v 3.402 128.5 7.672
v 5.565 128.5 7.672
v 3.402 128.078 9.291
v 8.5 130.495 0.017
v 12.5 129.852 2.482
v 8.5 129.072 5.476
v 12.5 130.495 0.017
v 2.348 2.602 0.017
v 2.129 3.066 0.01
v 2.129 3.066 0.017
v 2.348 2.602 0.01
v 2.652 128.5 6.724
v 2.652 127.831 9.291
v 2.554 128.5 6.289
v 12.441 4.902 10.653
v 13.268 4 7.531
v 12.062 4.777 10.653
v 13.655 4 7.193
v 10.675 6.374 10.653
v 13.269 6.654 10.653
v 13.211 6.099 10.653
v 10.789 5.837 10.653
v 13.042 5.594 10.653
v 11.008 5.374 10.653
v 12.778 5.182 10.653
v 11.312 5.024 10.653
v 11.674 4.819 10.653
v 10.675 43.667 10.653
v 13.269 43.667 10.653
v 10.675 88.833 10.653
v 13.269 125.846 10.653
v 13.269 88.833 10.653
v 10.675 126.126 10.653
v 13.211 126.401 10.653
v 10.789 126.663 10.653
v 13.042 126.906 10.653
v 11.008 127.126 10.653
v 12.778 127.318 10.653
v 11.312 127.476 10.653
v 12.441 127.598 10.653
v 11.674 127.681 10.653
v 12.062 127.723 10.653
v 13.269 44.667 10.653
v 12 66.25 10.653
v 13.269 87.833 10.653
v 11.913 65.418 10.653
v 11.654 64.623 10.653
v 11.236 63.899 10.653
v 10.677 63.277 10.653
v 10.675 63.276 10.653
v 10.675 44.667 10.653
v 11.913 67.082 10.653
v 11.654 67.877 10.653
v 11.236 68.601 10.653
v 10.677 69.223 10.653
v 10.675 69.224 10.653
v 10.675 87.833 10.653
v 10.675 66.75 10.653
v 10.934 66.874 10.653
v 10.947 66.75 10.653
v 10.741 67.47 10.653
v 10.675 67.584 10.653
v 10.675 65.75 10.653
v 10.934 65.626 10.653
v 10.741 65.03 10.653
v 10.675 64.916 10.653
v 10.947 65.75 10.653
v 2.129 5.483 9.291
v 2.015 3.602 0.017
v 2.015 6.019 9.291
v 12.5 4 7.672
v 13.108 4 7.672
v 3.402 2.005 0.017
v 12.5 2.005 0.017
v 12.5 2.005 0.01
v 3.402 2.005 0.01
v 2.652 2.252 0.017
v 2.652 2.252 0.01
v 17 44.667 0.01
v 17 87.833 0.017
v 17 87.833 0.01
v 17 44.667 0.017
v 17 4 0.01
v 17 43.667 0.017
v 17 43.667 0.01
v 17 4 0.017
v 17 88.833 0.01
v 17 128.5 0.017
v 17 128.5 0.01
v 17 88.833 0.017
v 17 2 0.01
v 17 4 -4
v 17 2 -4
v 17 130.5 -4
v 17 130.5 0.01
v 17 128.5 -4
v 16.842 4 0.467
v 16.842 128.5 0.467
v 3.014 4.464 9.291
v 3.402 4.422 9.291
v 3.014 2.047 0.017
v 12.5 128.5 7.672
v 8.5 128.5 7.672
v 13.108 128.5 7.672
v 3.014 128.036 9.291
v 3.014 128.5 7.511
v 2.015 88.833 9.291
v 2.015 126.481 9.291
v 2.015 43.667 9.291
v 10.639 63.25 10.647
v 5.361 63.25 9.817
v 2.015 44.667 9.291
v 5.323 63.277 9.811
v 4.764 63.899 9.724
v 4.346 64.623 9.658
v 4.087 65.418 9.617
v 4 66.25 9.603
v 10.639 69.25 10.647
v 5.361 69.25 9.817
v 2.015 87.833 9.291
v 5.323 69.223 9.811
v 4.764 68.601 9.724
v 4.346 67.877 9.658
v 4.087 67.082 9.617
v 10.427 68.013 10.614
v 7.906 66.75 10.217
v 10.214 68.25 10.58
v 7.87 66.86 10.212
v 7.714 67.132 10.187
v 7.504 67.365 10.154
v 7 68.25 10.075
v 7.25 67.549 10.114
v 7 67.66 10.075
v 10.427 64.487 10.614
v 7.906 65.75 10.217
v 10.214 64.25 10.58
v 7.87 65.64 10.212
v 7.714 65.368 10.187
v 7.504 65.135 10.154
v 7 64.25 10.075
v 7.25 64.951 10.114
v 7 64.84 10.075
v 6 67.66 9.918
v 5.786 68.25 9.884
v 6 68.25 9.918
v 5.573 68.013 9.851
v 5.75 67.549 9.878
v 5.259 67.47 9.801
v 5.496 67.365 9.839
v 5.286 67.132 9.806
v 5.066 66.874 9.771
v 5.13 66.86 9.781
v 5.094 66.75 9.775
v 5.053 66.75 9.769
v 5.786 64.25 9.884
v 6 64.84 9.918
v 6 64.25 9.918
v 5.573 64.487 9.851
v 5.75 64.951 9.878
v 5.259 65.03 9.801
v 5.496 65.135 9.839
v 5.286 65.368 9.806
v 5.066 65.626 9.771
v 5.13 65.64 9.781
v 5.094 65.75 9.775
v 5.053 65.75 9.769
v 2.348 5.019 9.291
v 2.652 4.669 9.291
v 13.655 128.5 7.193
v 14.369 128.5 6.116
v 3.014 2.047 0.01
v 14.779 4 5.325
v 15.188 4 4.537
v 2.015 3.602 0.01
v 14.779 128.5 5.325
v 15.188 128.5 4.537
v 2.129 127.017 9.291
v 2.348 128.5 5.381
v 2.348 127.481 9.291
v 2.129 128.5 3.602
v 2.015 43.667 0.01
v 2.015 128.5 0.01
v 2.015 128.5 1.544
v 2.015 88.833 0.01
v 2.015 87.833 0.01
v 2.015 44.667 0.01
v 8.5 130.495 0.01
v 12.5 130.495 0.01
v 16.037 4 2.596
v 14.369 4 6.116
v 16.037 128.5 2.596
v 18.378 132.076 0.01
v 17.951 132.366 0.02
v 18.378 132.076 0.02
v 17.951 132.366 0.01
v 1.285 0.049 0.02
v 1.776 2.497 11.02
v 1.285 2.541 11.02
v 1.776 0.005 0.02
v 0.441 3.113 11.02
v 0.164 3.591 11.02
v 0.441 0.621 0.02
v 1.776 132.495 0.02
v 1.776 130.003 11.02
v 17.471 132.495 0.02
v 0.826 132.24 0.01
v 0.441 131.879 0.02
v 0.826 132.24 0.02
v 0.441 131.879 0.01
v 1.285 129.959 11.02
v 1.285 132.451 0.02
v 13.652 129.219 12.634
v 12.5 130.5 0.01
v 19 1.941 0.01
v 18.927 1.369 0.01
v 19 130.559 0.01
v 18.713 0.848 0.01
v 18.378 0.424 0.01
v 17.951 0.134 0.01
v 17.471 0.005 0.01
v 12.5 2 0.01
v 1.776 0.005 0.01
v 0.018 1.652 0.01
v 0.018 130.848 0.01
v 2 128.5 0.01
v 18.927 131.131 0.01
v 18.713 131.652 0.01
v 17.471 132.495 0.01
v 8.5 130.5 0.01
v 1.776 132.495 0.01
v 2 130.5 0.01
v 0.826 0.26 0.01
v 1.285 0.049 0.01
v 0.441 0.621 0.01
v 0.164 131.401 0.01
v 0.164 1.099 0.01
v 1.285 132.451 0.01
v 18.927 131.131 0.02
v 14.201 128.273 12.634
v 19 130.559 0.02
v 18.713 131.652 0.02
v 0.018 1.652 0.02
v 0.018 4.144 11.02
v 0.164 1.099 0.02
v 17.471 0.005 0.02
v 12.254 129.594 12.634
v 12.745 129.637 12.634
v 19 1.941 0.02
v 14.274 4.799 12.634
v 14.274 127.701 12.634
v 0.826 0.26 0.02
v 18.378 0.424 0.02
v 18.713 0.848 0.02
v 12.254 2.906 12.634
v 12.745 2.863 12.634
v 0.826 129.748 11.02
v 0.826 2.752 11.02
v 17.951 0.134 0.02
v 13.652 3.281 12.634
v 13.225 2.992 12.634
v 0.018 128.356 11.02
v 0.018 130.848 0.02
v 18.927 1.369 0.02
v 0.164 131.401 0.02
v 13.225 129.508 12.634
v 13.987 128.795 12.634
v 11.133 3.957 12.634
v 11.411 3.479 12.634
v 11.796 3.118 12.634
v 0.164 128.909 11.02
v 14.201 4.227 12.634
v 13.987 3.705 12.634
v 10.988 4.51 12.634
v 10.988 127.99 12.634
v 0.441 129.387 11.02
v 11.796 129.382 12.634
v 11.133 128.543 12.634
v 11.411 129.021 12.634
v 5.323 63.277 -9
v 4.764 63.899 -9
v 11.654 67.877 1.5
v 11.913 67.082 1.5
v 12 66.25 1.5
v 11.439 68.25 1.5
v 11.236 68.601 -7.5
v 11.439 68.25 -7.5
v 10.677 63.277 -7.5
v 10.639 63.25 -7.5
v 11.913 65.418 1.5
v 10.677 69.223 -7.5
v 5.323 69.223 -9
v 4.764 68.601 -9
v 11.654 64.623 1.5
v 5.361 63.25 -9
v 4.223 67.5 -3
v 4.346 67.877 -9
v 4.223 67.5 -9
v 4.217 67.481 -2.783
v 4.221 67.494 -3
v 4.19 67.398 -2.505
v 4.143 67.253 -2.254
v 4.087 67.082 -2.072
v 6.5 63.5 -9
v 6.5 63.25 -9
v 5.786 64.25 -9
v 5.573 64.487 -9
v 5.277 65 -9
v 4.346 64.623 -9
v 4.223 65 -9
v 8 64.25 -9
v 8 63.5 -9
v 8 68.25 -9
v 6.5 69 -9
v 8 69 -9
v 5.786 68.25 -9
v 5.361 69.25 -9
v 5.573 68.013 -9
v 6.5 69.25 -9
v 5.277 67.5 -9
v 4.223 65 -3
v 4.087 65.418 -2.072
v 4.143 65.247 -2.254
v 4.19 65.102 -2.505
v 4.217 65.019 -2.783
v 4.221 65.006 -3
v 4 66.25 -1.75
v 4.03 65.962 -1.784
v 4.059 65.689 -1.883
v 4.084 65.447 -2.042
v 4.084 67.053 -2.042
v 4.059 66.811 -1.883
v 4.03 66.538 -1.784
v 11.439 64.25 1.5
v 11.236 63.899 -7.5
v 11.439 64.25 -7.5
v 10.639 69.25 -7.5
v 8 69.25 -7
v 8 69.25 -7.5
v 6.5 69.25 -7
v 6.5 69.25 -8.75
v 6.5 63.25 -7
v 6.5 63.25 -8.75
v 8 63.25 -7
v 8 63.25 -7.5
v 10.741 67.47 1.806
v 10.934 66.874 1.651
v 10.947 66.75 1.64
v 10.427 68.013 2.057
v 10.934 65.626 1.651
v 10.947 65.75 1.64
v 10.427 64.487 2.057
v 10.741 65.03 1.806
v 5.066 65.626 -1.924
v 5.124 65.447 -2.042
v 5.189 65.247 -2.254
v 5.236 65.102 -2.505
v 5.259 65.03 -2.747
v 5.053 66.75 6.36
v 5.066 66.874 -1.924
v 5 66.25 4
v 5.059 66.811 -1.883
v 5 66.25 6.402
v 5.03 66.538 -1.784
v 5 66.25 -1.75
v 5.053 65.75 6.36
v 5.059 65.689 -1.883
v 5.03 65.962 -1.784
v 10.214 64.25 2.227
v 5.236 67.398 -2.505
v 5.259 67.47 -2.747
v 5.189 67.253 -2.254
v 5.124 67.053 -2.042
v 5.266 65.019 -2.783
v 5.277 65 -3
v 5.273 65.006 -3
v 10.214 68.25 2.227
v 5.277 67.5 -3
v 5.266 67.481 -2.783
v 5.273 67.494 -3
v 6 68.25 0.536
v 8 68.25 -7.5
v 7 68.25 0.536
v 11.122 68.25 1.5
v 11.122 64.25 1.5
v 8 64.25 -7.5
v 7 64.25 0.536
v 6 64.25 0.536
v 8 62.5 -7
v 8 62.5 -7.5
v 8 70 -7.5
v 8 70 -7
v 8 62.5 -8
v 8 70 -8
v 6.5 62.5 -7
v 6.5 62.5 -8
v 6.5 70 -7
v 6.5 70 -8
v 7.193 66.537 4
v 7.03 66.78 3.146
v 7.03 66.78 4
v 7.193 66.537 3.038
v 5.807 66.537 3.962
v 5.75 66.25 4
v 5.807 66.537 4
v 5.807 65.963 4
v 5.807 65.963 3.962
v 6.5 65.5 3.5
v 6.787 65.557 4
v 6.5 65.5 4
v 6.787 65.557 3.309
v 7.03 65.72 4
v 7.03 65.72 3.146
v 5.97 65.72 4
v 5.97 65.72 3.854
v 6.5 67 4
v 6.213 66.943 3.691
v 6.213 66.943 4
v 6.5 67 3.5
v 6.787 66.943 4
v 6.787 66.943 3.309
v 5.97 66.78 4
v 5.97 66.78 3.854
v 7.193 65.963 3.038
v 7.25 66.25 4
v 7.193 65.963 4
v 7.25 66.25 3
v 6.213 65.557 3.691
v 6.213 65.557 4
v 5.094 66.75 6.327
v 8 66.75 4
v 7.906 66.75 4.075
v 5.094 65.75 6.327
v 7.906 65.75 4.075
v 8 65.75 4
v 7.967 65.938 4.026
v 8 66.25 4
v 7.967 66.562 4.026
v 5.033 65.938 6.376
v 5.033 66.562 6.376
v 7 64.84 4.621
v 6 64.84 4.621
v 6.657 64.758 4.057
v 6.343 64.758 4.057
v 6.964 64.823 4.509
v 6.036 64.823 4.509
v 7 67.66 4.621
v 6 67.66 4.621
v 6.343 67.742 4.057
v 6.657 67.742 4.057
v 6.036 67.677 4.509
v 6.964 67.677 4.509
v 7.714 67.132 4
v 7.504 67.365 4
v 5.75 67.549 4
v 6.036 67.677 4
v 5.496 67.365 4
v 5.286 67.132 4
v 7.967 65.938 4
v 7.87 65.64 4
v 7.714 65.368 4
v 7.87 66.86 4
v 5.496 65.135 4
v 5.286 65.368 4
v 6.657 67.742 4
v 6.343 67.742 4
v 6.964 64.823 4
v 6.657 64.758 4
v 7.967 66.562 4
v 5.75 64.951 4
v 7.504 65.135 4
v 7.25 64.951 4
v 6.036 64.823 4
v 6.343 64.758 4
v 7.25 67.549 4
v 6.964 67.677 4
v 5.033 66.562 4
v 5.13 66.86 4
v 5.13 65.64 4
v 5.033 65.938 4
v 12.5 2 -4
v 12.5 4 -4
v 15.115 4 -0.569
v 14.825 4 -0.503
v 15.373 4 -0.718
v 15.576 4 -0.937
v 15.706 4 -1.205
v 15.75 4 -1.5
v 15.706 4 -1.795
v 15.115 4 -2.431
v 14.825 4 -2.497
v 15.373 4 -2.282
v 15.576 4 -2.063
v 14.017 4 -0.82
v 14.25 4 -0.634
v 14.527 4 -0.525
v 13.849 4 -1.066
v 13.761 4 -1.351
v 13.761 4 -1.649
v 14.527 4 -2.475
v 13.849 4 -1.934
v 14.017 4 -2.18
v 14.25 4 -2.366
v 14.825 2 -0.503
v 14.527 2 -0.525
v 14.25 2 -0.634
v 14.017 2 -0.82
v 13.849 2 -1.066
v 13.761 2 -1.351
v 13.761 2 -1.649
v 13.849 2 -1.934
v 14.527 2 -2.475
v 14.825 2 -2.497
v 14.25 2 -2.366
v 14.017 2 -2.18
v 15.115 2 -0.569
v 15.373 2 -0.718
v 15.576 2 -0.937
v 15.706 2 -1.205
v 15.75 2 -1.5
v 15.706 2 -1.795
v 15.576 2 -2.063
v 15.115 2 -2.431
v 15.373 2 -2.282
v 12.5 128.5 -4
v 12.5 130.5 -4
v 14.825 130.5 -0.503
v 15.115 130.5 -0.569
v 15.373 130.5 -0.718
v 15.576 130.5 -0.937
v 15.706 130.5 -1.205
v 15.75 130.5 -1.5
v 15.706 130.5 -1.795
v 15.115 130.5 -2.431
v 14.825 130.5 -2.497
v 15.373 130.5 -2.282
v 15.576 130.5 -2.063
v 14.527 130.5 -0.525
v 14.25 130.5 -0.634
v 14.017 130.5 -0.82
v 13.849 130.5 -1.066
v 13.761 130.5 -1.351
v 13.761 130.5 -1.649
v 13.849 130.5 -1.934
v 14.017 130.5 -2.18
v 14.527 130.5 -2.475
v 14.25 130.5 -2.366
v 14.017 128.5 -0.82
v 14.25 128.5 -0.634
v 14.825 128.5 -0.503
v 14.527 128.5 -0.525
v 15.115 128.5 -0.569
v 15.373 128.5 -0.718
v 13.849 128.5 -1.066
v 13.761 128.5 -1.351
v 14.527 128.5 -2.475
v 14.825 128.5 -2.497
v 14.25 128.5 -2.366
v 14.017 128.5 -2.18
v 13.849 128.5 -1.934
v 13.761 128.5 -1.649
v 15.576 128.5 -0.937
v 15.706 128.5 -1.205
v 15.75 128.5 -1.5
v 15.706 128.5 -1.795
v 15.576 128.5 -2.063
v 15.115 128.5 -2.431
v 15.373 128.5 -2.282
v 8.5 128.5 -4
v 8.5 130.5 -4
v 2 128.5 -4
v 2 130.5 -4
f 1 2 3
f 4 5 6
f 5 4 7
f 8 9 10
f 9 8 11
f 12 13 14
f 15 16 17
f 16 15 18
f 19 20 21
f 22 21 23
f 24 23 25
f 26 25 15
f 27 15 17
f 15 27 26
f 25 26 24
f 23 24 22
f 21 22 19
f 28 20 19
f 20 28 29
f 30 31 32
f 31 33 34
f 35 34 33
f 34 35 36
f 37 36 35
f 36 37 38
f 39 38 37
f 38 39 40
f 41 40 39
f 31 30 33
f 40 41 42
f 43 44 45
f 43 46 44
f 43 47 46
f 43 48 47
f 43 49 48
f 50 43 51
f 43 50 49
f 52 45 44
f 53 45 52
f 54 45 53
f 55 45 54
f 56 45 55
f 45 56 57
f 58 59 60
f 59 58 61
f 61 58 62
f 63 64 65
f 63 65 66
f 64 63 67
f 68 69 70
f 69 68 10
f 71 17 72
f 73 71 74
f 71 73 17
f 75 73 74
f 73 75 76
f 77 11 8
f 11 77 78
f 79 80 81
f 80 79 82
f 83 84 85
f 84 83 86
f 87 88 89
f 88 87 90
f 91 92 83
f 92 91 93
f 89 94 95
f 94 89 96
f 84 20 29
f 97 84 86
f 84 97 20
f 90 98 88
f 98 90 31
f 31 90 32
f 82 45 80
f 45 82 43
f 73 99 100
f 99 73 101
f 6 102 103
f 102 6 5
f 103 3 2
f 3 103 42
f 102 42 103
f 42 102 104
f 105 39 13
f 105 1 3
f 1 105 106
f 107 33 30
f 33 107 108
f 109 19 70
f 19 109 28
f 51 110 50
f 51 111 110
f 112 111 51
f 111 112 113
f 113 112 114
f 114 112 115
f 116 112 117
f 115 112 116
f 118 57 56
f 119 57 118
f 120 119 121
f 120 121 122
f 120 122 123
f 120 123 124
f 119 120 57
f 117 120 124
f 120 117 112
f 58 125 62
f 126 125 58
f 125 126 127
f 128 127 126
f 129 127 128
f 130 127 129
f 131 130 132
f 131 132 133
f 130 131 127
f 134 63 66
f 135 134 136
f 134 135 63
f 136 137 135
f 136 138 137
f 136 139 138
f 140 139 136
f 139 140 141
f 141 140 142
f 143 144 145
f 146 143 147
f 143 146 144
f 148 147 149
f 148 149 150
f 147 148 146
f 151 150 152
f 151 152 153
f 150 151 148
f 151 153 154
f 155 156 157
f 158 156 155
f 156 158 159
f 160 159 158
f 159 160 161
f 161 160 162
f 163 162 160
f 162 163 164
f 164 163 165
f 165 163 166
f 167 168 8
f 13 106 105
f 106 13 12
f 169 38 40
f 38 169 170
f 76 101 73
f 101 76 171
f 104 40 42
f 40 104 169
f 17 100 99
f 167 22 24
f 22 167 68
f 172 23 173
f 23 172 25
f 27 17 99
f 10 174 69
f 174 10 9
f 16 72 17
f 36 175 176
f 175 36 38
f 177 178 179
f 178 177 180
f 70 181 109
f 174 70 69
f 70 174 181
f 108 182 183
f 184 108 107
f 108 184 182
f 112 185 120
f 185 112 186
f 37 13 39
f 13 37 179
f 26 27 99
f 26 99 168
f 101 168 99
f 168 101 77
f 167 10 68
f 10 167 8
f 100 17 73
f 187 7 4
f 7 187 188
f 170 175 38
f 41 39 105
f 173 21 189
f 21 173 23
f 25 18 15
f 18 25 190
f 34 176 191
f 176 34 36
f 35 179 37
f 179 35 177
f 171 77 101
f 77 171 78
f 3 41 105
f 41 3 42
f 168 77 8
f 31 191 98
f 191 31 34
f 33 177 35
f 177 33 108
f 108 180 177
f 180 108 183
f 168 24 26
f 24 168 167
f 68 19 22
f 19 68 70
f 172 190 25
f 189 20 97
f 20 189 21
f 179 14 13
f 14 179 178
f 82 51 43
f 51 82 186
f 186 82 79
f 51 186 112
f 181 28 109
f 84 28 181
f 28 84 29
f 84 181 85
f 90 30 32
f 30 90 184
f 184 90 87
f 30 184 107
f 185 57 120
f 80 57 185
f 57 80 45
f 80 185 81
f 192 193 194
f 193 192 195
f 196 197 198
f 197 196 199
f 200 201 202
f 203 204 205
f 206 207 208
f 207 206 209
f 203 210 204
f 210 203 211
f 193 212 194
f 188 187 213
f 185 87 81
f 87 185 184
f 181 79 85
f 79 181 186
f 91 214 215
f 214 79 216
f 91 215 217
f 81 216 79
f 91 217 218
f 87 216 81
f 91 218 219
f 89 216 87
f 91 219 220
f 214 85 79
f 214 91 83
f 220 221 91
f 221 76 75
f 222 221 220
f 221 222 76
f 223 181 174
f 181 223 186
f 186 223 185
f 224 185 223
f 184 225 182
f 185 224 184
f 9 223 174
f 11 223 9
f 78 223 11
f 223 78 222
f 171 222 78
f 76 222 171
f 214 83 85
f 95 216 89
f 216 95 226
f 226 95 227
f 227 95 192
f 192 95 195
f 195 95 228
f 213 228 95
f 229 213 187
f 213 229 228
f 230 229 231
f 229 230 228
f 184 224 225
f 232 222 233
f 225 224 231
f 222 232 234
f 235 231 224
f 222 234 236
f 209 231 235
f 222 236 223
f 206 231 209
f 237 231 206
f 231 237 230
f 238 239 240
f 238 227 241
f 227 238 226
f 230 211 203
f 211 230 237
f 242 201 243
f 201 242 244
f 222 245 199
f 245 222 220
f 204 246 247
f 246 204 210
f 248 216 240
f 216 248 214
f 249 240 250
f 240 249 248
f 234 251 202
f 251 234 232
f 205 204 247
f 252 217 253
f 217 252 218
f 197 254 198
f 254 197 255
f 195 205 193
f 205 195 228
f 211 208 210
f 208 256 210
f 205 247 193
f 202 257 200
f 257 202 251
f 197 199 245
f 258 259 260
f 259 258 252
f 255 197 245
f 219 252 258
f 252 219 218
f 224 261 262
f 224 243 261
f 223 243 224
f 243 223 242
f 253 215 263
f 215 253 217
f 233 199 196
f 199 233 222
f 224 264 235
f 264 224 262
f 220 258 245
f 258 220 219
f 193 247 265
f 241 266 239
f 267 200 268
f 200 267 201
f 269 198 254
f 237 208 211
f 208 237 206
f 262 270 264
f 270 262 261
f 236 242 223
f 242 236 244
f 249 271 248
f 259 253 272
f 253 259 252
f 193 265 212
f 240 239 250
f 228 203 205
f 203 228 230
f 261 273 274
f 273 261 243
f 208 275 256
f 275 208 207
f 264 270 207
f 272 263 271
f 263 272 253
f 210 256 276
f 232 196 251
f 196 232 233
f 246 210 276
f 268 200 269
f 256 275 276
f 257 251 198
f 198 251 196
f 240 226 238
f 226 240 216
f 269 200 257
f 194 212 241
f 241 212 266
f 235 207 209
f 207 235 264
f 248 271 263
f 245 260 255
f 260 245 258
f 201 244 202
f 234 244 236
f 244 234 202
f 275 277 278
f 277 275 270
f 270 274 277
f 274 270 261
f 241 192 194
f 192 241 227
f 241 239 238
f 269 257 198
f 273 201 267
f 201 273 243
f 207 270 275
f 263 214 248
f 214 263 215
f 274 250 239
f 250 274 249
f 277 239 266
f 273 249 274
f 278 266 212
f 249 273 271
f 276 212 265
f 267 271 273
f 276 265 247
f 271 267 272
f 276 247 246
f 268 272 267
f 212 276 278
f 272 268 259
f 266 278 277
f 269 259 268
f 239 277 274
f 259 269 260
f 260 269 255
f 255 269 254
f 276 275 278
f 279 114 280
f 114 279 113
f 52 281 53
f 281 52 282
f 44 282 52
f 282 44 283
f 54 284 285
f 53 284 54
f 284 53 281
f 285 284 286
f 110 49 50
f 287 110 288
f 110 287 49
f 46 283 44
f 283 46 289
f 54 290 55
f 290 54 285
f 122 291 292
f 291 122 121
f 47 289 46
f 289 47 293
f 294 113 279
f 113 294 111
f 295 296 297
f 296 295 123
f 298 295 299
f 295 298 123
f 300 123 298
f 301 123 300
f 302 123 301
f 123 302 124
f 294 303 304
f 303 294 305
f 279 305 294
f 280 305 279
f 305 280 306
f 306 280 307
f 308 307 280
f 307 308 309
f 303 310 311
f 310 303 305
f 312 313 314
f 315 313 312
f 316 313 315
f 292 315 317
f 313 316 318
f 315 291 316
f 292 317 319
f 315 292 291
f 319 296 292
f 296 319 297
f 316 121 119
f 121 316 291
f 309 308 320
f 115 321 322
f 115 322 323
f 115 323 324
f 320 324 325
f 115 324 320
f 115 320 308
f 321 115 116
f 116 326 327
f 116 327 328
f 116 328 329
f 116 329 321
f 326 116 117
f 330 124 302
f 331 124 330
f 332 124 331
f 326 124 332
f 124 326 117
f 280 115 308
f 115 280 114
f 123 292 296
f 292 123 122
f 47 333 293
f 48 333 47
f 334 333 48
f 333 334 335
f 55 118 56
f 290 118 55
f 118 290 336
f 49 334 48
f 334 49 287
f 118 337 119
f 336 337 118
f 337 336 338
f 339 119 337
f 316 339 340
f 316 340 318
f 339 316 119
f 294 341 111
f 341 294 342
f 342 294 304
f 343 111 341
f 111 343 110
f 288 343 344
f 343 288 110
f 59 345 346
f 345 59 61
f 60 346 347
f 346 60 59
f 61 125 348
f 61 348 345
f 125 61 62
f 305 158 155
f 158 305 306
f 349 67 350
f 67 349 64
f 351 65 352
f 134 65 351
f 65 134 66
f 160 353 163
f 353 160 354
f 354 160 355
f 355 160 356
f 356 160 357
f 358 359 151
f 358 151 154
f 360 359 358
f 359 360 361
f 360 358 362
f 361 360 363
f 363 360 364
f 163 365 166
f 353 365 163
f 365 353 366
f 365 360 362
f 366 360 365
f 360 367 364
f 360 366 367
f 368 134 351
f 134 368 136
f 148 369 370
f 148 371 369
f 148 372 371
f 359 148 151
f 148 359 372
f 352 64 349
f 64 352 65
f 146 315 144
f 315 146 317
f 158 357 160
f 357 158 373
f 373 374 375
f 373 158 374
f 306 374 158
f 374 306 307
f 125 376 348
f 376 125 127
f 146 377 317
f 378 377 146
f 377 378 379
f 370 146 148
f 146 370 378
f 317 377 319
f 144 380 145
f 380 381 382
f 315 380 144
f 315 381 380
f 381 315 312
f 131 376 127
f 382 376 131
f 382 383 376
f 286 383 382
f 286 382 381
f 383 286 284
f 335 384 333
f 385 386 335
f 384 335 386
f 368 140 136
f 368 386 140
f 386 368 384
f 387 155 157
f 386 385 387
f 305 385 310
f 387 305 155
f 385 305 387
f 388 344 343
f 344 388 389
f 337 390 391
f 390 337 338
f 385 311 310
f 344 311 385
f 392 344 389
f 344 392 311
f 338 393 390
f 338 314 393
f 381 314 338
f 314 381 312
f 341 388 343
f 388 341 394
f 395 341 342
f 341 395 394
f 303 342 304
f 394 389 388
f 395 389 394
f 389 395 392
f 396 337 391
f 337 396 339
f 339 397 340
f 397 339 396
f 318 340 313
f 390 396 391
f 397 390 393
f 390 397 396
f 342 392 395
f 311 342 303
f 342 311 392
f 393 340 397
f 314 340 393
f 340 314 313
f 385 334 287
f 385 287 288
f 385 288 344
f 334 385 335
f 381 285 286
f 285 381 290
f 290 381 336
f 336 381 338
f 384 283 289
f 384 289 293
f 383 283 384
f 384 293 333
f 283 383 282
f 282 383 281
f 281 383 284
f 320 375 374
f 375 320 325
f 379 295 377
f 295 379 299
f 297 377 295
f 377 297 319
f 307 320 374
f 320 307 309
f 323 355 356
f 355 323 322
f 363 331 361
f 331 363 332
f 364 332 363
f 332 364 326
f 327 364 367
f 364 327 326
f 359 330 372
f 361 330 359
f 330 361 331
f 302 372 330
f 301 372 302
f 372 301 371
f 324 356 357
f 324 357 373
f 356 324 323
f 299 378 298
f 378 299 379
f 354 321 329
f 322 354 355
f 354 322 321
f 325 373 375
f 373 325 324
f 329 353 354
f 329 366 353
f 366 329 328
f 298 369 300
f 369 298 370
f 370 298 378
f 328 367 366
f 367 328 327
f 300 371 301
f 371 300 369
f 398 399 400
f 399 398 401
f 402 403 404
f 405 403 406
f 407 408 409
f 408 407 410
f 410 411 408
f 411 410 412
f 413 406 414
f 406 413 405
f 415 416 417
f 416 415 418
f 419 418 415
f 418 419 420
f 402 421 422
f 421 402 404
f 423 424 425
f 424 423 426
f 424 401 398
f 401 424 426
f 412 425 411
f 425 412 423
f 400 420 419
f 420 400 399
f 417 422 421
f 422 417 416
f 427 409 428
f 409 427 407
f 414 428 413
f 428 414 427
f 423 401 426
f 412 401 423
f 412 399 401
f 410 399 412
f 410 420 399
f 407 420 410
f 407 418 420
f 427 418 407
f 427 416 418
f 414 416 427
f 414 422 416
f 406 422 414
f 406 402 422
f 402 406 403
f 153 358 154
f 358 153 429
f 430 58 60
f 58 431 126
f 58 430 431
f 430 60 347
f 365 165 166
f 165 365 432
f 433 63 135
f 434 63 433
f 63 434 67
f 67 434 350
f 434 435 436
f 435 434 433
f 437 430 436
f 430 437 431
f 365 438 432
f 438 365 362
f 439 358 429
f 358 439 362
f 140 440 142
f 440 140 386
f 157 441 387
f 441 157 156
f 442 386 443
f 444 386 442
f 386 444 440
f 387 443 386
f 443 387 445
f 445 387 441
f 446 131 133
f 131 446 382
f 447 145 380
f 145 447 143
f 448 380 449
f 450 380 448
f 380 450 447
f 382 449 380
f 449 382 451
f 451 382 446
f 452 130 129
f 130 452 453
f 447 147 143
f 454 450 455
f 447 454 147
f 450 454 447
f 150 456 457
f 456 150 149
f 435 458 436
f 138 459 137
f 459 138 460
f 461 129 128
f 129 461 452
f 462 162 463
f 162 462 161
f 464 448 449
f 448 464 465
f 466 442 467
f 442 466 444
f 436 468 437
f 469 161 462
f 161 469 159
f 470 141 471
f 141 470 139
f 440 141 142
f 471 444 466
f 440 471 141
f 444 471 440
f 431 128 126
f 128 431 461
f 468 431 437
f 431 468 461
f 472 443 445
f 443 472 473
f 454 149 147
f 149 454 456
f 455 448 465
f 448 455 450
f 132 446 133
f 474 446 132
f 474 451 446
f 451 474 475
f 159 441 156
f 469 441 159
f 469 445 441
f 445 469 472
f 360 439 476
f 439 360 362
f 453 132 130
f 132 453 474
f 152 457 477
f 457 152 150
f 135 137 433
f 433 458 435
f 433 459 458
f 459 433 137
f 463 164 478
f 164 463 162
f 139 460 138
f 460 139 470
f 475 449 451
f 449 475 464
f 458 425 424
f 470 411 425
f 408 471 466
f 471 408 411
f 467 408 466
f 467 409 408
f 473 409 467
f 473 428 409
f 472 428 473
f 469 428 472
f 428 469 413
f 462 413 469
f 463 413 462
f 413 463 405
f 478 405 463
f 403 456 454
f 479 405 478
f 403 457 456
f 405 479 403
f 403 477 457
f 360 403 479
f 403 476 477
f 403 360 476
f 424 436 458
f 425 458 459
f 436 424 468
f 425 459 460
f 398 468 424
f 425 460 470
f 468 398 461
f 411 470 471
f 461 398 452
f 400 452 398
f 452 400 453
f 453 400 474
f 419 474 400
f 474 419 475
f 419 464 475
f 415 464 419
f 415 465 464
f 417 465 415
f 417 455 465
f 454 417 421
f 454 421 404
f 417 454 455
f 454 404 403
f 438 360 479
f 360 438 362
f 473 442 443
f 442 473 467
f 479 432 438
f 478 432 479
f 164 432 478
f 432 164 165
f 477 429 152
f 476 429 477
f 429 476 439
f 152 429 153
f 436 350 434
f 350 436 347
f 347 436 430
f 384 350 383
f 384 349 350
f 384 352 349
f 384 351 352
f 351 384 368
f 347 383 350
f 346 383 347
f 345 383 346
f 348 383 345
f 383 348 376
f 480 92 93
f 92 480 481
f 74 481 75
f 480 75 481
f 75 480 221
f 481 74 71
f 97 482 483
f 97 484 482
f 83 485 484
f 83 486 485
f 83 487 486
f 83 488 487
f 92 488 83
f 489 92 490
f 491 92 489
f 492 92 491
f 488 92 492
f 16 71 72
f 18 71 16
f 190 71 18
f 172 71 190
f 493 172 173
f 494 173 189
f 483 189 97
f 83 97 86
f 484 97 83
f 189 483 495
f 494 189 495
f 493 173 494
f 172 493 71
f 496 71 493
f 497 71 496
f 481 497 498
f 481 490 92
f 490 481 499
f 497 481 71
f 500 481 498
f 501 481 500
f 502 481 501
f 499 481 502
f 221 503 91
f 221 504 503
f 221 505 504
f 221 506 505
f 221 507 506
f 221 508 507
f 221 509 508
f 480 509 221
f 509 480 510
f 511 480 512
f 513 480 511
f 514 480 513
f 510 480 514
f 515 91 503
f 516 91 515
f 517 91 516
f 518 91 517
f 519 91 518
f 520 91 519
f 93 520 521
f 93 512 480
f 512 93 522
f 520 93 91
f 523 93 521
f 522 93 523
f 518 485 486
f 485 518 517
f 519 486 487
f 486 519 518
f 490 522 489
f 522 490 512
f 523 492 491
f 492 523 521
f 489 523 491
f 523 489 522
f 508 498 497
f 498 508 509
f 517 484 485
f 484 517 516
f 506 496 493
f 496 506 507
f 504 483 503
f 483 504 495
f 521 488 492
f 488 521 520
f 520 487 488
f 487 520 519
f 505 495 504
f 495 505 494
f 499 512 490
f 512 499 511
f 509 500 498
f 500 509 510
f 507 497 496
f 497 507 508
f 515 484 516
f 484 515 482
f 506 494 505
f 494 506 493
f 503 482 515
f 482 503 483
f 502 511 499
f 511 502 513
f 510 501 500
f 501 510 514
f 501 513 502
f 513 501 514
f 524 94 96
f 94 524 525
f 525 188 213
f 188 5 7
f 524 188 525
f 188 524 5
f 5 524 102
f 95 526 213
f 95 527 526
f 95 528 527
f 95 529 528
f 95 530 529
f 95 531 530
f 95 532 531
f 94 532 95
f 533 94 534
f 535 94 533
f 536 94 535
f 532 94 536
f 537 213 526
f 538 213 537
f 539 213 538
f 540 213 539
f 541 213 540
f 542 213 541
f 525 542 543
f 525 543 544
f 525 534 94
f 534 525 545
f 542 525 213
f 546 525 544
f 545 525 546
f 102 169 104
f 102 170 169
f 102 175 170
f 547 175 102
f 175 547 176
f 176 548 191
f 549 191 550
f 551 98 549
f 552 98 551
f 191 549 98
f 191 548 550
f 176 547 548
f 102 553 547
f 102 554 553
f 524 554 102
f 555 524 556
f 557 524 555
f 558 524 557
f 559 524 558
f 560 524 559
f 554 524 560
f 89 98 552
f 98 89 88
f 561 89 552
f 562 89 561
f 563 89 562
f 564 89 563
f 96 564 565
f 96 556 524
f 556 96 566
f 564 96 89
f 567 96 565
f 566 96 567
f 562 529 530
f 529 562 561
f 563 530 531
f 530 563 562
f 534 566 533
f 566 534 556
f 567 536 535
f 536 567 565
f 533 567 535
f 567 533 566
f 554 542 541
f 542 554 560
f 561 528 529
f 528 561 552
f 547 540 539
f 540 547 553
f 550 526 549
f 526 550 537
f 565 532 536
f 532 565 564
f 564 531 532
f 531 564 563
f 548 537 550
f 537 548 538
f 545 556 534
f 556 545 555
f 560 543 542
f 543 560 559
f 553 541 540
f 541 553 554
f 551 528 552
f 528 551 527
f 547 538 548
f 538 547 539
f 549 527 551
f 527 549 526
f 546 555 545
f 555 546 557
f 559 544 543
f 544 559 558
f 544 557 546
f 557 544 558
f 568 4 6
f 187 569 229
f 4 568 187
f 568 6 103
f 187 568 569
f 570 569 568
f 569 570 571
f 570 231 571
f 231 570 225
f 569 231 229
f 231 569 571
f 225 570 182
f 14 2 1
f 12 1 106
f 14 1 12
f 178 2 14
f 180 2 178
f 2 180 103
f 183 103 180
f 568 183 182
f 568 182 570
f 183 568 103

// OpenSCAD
//measures are in millimeters
//(feel free to cocnvert them to attoparsecs)
AY=132.5;
AX=19.0;
BY=127.5;
BLX=14.5;
EZ=11.0;
FLZ=14.0;
H=12.75;
SHAFT_OFF_Y=AY/2;
SHAFT_OFF_X=8.0; //???
CLIP_X=2;
CLIP_Y=0.75;
CLIP_H=3*CLIP_Y;
CORNER_RADIUS=2;
SHAFT_X=8.0;
SHAFT_Y=6.0;
SHAFT_LENGTH=9.0;
SHAFT_THICKNESS=1.0;
SHAFT_CLIP_WIDTH=3.0;
SHAFT_CLIP_THICKNESS=0.75;
SHAFT_CLIP_HEIGHT=2.0;
SHAFT_CLIP_SLOPE_DEPTH=1.0;
SHAFT_CLIP_ANGLE=45;
SHAFT_END_CUTOUT_HEIGHT=1.5;
SHAFT_LARGE_SLOT_TO_BASE=1.5;
SHAFT_SMALL_SLOT_LENGTH=7.25;
SHAFT_SMALL_SLOT_WIDTH=2.5;
SHAFT_SPRING_HOLDER_WIDTH=3.0;
SHAFT_SPRING_HOLDER_TO_BASE=4.0;
SHAFT_SPRING_GUIDE_WIDTH=1.0;
SHAFT_SPRING_GUIDE_SIDES_HEIGHT=3.5;
STRUT_THICKNESS=1;
STRUT_HEIGHT=3;
STRUT_SPACING=1;
SHAFT_SPRING_HOLDER_NIPPLE_HEIGHT=1;
SHAFT_SPRING_HOLDER_NIPPLE_RADIUS=0.75;

WIRE_HOLDER_HEIGHT=4.0;
WIRE_HOLDER_WIDTH=4.5;
WIRE_DIAMETER=2.0;
WIRE_HOLE_OFF_Z=0.5;

MYSTERIOUS_TAB_WIDTH=6.5;
MYSTERIOUS_TAB_HEIGHT=5.5;

SHAFT_SMALL_SLOT_BEVEL=0.5;

WallThickness=2.0;
ClipWidth=2.2;
ClipDepth=0.75;

//ascfront=FLZ/sqrt(pow(FLZ,2)-pow(H,2));
//asctop=(H-EZ)/sqrt(pow(BLX,2)-pow((H-EZ),2));

alpha=asin((H-EZ)/BLX);
beta=asin(H/FLZ);
gamma=90-asin((0.5*(AY-BY))/EZ);

module keycap(){
	scale([AX/(AX+2*CORNER_RADIUS),AY/(AY+2*CORNER_RADIUS),1])
	translate([CORNER_RADIUS,CORNER_RADIUS,0.01])
	minkowski(){
		difference(){
			cube([AX,AY,H]);
			rotate(a=gamma,v=[1,0,0]) cube([200,200,200]);
			translate([0,AY,0]) rotate(a=90-gamma,v=[1,0,0]) cube([200,200,200]);
			translate([0,0,EZ]) rotate(a=-alpha,v=[0,1,0]) translate([-100,0,0]) cube([200,200,200]);
			translate([AX,0,0]) rotate(a=beta-90,v=[0,1,0]) cube([200,200,200]);
		}
		cylinder(h=0.01,r=CORNER_RADIUS,$fs=0.6);
		//rotate(a=90,v=[1,0,0]) cylinder(h=0.01,r=1,$fs=0.3);
	}
}

module shaft(){
	spring_guide_length = SHAFT_X-SHAFT_THICKNESS-SHAFT_SPRING_HOLDER_WIDTH;
	spring_guide_height = SHAFT_SPRING_HOLDER_TO_BASE-SHAFT_LARGE_SLOT_TO_BASE;
	translate([0,0,-SHAFT_LENGTH]) difference(){
		union(){
			difference(){
				union(){
					difference(){
						intersection(){
							cylinder(h=200,r=SHAFT_X/2,$fs=0.3);
							translate([-SHAFT_X/2,-SHAFT_Y/2,0]) cube([SHAFT_X,SHAFT_Y,200]);
						}
						intersection(){
							cylinder(h=200,r=SHAFT_X/2-SHAFT_THICKNESS,$fs=0.3);
							translate([-SHAFT_X/2+SHAFT_THICKNESS,-SHAFT_Y/2+SHAFT_THICKNESS,0]) cube([SHAFT_X-2*SHAFT_THICKNESS,SHAFT_Y-2*SHAFT_THICKNESS,200]);
						}
					}
					translate([-SHAFT_CLIP_WIDTH/2, -SHAFT_CLIP_THICKNESS-SHAFT_Y/2,0]) cube([SHAFT_CLIP_WIDTH/2, SHAFT_CLIP_THICKNESS,SHAFT_CLIP_HEIGHT]);
					translate([-SHAFT_CLIP_WIDTH/2, SHAFT_Y/2,0]) cube([SHAFT_CLIP_WIDTH/2, SHAFT_CLIP_THICKNESS,SHAFT_CLIP_HEIGHT]);
				}
				translate([-SHAFT_CLIP_WIDTH/2, -SHAFT_CLIP_THICKNESS-SHAFT_Y/2+SHAFT_CLIP_SLOPE_DEPTH,0]) rotate(a=90+SHAFT_CLIP_ANGLE,v=[1,0,0]) cube([SHAFT_CLIP_WIDTH/2,200,200]);
				translate([-SHAFT_CLIP_WIDTH/2, SHAFT_Y/2+SHAFT_CLIP_THICKNESS-SHAFT_CLIP_SLOPE_DEPTH,0]) mirror([0,1,0]) rotate(a=90+SHAFT_CLIP_ANGLE,v=[1,0,0]) cube([SHAFT_CLIP_WIDTH/2,200,200]);
				translate([0,-100,0]) cube([200,200,SHAFT_END_CUTOUT_HEIGHT]);
				translate([0,-SHAFT_Y/2+SHAFT_THICKNESS,0]) cube([200,SHAFT_Y-SHAFT_THICKNESS*2,SHAFT_LENGTH+SHAFT_LARGE_SLOT_TO_BASE]);
				//small slot cutout
				translate([0,-SHAFT_SMALL_SLOT_WIDTH/2,0]){
					mirror([1,0,0]) cube([200,SHAFT_SMALL_SLOT_WIDTH,SHAFT_SMALL_SLOT_LENGTH-0.5*SHAFT_SMALL_SLOT_WIDTH]);
				}
				//small slot cutout
				translate([0,0,SHAFT_SMALL_SLOT_LENGTH-0.5*SHAFT_SMALL_SLOT_WIDTH]) rotate(a=-90,v=[0,1,0]) cylinder(r=SHAFT_SMALL_SLOT_WIDTH/2,h=SHAFT_X/2,$fs=0.3);
			}
			//spring holder
			translate([-SHAFT_X/2+SHAFT_SPRING_HOLDER_WIDTH/2+SHAFT_THICKNESS,0,SHAFT_LENGTH+SHAFT_SPRING_HOLDER_TO_BASE]) cylinder(r=SHAFT_SPRING_HOLDER_WIDTH/2,h=200,$fs=0.3);
			intersection(){
				translate([-SHAFT_X/2+SHAFT_SPRING_HOLDER_WIDTH/2+SHAFT_THICKNESS,0,SHAFT_LENGTH+SHAFT_SPRING_HOLDER_TO_BASE-SHAFT_SPRING_HOLDER_NIPPLE_HEIGHT]) cylinder(r=SHAFT_SPRING_HOLDER_NIPPLE_RADIUS,h=200,$fs=0.3);
				translate([0,0,SHAFT_LENGTH+SHAFT_SPRING_HOLDER_TO_BASE-SHAFT_SPRING_HOLDER_NIPPLE_HEIGHT*1.5]) rotate(v=[0,1,0], a=atan(SHAFT_SPRING_HOLDER_NIPPLE_HEIGHT/(SHAFT_SPRING_HOLDER_NIPPLE_RADIUS*2))) translate([-100,-100,0]) cube([200,200,200]);
			}
			intersection(){
				difference(){
					translate([SHAFT_X/2-SHAFT_THICKNESS,-0.5*SHAFT_SPRING_GUIDE_WIDTH,SHAFT_LENGTH+SHAFT_LARGE_SLOT_TO_BASE]) mirror([1,0,0]) cube([200,SHAFT_SPRING_GUIDE_WIDTH,200]);
					translate([-SHAFT_X/2+SHAFT_SPRING_HOLDER_WIDTH+SHAFT_THICKNESS,-0.5*SHAFT_SPRING_GUIDE_WIDTH,SHAFT_LENGTH+SHAFT_SPRING_HOLDER_TO_BASE])
					mirror([1,0,0]) rotate(a=90-asin(spring_guide_height/spring_guide_length),v=[0,1,0]) mirror([0,0,1]) translate([0,0,-100]) cube([200,SHAFT_SPRING_GUIDE_WIDTH,200]);
				}
				cube([SHAFT_X-SHAFT_THICKNESS,SHAFT_Y,200],center=true);
			}
			//side spring guides
			difference(){
				translate([-SHAFT_X/2+SHAFT_THICKNESS+(SHAFT_SPRING_HOLDER_WIDTH-SHAFT_SPRING_GUIDE_WIDTH)/2,-SHAFT_Y/2+SHAFT_THICKNESS,SHAFT_LENGTH+SHAFT_SPRING_HOLDER_TO_BASE-SHAFT_SPRING_GUIDE_SIDES_HEIGHT]) cube([SHAFT_SPRING_GUIDE_WIDTH,SHAFT_Y-2*SHAFT_THICKNESS,EZ-SHAFT_SPRING_HOLDER_TO_BASE+SHAFT_SPRING_GUIDE_SIDES_HEIGHT]);
				translate([-SHAFT_X/2+SHAFT_THICKNESS+(SHAFT_SPRING_HOLDER_WIDTH-SHAFT_SPRING_GUIDE_WIDTH)/2,-SHAFT_SPRING_HOLDER_WIDTH/2,SHAFT_LENGTH+SHAFT_SPRING_HOLDER_TO_BASE]) rotate(a=-asin(((SHAFT_Y-SHAFT_SPRING_HOLDER_WIDTH)/2-SHAFT_THICKNESS)/SHAFT_SPRING_GUIDE_SIDES_HEIGHT),v=[1,0,0]) translate([0,0,-100]) cube([SHAFT_SPRING_GUIDE_WIDTH,200,200]);
			}
			difference(){
				translate([-SHAFT_X/2+SHAFT_THICKNESS+(SHAFT_SPRING_HOLDER_WIDTH-SHAFT_SPRING_GUIDE_WIDTH)/2,-SHAFT_Y/2+SHAFT_THICKNESS,SHAFT_LENGTH+SHAFT_SPRING_HOLDER_TO_BASE-SHAFT_SPRING_GUIDE_SIDES_HEIGHT]) cube([SHAFT_SPRING_GUIDE_WIDTH,SHAFT_Y-2*SHAFT_THICKNESS,EZ-SHAFT_SPRING_HOLDER_TO_BASE+SHAFT_SPRING_GUIDE_SIDES_HEIGHT]);
				mirror([0,1,0]) translate([-SHAFT_X/2+SHAFT_THICKNESS+(SHAFT_SPRING_HOLDER_WIDTH-SHAFT_SPRING_GUIDE_WIDTH)/2,-SHAFT_SPRING_HOLDER_WIDTH/2,SHAFT_LENGTH+SHAFT_SPRING_HOLDER_TO_BASE]) rotate(a=-asin(((SHAFT_Y-SHAFT_SPRING_HOLDER_WIDTH)/2-SHAFT_THICKNESS)/SHAFT_SPRING_GUIDE_SIDES_HEIGHT),v=[1,0,0]) translate([0,0,-100]) cube([SHAFT_SPRING_GUIDE_WIDTH,200,200]);
			}
		}
		translate([-SHAFT_X/2+SHAFT_SPRING_HOLDER_WIDTH+SHAFT_THICKNESS,-SHAFT_Y/2+SHAFT_THICKNESS,SHAFT_LENGTH+SHAFT_SPRING_HOLDER_TO_BASE]) mirror([1,0,0]) rotate(a=90-asin(spring_guide_height/spring_guide_length),v=[0,1,0]) mirror([0,0,1]) cube([SHAFT_THICKNESS,SHAFT_Y-2*SHAFT_THICKNESS,200]);
	}
}

difference(){
	keycap();
	difference(){
		translate([WallThickness, WallThickness, 0]) scale(v=[1-2*WallThickness/AX, 1-2*WallThickness/AY, 1-WallThickness/H]) keycap();
		translate([0,AY/3,0]) cube([200,STRUT_THICKNESS,200],center=true);
		translate([0,2*AY/3,0]) cube([200,STRUT_THICKNESS,200],center=true);
	}
}
intersection(){
	union(){
		translate([WallThickness, WallThickness, 0]) scale(v=[1-2*WallThickness/AX, 1-2*WallThickness/AY, 1-WallThickness/H]) keycap();
		translate([-200,-200,-399.9]) cube([400,400,400]);
	}
	union(){
		translate([SHAFT_OFF_X,SHAFT_OFF_Y]) shaft();
		translate([AX-WIRE_HOLDER_WIDTH-WallThickness, WallThickness, -WIRE_HOLDER_HEIGHT]) difference(){
			cube([WIRE_HOLDER_WIDTH,WallThickness,WIRE_HOLDER_HEIGHT+H]);
			translate([WIRE_HOLDER_WIDTH/2,WallThickness*1.5,WIRE_HOLDER_HEIGHT-WIRE_DIAMETER/2-WIRE_HOLE_OFF_Z]) rotate([90,0,0]) cylinder(r=WIRE_DIAMETER/2,h=WallThickness*2,$fs=0.3);
		}
		translate([AX-WIRE_HOLDER_WIDTH-WallThickness, AY-2*WallThickness, -WIRE_HOLDER_HEIGHT]) difference(){
			cube([WIRE_HOLDER_WIDTH,WallThickness,WIRE_HOLDER_HEIGHT+H]);
			translate([WIRE_HOLDER_WIDTH/2,WallThickness*1.5,WIRE_HOLDER_HEIGHT-WIRE_DIAMETER/2-WIRE_HOLE_OFF_Z]) rotate([90,0,0]) cylinder(r=WIRE_DIAMETER/2,h=WallThickness*2,$fs=0.3);
		}
		translate([WallThickness, AY-2*WallThickness, -WIRE_HOLDER_HEIGHT]) cube([MYSTERIOUS_TAB_WIDTH,WallThickness,H+MYSTERIOUS_TAB_HEIGHT]);
	}
}
